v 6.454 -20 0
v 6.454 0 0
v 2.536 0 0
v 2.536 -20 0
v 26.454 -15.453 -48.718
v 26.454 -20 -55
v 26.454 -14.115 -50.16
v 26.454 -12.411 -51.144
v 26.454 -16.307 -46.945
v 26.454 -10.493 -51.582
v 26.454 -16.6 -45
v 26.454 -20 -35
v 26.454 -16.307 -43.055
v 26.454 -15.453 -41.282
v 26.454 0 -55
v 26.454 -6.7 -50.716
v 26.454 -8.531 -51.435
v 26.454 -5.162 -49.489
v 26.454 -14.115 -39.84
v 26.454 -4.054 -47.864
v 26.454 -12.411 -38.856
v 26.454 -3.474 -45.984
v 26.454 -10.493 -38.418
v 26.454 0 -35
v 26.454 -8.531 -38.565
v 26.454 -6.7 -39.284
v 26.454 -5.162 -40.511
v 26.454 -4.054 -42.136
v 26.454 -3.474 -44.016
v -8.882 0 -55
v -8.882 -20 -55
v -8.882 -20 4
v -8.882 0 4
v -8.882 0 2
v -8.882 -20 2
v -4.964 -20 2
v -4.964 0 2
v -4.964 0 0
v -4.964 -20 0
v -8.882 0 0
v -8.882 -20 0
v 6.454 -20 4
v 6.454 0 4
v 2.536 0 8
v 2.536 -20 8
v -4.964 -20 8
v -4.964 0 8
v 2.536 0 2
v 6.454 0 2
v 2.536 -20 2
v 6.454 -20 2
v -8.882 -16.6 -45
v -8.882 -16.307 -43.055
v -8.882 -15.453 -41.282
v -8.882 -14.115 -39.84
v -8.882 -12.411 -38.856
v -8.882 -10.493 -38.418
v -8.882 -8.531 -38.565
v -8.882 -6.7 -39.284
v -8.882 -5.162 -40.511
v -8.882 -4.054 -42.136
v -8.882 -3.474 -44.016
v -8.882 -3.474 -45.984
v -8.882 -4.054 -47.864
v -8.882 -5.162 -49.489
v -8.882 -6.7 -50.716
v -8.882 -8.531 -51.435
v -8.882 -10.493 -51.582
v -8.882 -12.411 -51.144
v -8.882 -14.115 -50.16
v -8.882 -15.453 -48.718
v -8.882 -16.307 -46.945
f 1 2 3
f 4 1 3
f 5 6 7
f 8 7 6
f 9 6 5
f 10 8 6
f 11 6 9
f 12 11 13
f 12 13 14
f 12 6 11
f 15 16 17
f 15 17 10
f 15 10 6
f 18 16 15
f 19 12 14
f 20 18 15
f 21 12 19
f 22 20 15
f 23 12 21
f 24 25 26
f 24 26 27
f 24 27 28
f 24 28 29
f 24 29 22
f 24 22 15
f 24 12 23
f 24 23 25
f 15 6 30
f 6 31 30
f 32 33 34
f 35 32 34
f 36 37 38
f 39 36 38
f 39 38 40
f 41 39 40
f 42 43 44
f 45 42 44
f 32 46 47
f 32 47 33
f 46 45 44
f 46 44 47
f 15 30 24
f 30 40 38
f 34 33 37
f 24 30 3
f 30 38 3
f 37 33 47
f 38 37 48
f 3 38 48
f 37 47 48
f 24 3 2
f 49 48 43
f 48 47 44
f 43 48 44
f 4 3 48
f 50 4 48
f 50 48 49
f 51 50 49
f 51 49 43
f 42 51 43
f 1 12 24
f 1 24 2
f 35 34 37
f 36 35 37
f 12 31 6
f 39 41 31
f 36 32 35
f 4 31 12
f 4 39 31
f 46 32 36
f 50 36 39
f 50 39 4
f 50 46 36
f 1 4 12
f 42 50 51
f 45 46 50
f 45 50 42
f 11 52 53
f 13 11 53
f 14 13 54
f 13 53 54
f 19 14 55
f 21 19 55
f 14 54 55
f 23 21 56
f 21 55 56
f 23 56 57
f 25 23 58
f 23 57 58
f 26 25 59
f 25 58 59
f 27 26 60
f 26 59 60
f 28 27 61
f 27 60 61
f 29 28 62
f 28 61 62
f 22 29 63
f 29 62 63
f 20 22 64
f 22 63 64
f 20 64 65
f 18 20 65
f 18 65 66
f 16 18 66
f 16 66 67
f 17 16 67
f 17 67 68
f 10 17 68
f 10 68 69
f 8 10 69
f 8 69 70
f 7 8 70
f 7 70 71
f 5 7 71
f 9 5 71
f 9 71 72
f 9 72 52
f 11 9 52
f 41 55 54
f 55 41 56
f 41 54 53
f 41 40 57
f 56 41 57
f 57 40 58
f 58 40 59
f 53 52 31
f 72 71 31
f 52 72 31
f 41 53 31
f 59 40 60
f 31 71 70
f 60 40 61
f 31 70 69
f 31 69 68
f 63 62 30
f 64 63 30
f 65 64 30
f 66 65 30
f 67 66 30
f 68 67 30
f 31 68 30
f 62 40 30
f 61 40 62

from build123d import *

# Parameters (mm, degrees)
F1_DEPTH = 20
F2_W     = 20
F2_H     = 20
F3_DEPTH = 20
F5_D     = 13.2
F7_DEPTH = 20


with BuildPart() as f1:
    # F0 (on Front) → F1 (new body)
    with BuildSketch(Plane.XZ):
        Polygon((-4.964183461, 2), (-4.964183461, 0), (2.535816539, 0), (2.535816539, 2), (6.453912527, 2), (6.453912527, 4), (2.535816539, 8), (-4.964183461, 8), (-8.8822794489, 4), (-8.8822794489, 2), align=None)
        Polygon((2.535816539, 0), (-4.964183461, 0), (-8.8822794489, 0), (-8.8822794489, -55), (6.453912527, -55), (6.453912527, 0), align=None)
    extrude(amount=F1_DEPTH)

    # F2 (on face) → F3 (join)
    with BuildSketch(Plane.YZ.offset(6.453912527)):
        with Locations((-10, -45)):
            Rectangle(F2_W, F2_H)
    extrude(amount=F3_DEPTH)

    # F5 (through all)
    with Locations(Plane.YZ.offset(26.453912527)):
        with Locations((-10, -45)):
            Hole(F5_D / 2)

    # F6 (on face) → F7 (join)
    with BuildSketch(Plane.XZ.offset(20)):
        Polygon((6.453912527, -35), (26.453912527, -35), (6.453912527, 0), align=None)
    extrude(amount=-F7_DEPTH)


solid = f1.part
